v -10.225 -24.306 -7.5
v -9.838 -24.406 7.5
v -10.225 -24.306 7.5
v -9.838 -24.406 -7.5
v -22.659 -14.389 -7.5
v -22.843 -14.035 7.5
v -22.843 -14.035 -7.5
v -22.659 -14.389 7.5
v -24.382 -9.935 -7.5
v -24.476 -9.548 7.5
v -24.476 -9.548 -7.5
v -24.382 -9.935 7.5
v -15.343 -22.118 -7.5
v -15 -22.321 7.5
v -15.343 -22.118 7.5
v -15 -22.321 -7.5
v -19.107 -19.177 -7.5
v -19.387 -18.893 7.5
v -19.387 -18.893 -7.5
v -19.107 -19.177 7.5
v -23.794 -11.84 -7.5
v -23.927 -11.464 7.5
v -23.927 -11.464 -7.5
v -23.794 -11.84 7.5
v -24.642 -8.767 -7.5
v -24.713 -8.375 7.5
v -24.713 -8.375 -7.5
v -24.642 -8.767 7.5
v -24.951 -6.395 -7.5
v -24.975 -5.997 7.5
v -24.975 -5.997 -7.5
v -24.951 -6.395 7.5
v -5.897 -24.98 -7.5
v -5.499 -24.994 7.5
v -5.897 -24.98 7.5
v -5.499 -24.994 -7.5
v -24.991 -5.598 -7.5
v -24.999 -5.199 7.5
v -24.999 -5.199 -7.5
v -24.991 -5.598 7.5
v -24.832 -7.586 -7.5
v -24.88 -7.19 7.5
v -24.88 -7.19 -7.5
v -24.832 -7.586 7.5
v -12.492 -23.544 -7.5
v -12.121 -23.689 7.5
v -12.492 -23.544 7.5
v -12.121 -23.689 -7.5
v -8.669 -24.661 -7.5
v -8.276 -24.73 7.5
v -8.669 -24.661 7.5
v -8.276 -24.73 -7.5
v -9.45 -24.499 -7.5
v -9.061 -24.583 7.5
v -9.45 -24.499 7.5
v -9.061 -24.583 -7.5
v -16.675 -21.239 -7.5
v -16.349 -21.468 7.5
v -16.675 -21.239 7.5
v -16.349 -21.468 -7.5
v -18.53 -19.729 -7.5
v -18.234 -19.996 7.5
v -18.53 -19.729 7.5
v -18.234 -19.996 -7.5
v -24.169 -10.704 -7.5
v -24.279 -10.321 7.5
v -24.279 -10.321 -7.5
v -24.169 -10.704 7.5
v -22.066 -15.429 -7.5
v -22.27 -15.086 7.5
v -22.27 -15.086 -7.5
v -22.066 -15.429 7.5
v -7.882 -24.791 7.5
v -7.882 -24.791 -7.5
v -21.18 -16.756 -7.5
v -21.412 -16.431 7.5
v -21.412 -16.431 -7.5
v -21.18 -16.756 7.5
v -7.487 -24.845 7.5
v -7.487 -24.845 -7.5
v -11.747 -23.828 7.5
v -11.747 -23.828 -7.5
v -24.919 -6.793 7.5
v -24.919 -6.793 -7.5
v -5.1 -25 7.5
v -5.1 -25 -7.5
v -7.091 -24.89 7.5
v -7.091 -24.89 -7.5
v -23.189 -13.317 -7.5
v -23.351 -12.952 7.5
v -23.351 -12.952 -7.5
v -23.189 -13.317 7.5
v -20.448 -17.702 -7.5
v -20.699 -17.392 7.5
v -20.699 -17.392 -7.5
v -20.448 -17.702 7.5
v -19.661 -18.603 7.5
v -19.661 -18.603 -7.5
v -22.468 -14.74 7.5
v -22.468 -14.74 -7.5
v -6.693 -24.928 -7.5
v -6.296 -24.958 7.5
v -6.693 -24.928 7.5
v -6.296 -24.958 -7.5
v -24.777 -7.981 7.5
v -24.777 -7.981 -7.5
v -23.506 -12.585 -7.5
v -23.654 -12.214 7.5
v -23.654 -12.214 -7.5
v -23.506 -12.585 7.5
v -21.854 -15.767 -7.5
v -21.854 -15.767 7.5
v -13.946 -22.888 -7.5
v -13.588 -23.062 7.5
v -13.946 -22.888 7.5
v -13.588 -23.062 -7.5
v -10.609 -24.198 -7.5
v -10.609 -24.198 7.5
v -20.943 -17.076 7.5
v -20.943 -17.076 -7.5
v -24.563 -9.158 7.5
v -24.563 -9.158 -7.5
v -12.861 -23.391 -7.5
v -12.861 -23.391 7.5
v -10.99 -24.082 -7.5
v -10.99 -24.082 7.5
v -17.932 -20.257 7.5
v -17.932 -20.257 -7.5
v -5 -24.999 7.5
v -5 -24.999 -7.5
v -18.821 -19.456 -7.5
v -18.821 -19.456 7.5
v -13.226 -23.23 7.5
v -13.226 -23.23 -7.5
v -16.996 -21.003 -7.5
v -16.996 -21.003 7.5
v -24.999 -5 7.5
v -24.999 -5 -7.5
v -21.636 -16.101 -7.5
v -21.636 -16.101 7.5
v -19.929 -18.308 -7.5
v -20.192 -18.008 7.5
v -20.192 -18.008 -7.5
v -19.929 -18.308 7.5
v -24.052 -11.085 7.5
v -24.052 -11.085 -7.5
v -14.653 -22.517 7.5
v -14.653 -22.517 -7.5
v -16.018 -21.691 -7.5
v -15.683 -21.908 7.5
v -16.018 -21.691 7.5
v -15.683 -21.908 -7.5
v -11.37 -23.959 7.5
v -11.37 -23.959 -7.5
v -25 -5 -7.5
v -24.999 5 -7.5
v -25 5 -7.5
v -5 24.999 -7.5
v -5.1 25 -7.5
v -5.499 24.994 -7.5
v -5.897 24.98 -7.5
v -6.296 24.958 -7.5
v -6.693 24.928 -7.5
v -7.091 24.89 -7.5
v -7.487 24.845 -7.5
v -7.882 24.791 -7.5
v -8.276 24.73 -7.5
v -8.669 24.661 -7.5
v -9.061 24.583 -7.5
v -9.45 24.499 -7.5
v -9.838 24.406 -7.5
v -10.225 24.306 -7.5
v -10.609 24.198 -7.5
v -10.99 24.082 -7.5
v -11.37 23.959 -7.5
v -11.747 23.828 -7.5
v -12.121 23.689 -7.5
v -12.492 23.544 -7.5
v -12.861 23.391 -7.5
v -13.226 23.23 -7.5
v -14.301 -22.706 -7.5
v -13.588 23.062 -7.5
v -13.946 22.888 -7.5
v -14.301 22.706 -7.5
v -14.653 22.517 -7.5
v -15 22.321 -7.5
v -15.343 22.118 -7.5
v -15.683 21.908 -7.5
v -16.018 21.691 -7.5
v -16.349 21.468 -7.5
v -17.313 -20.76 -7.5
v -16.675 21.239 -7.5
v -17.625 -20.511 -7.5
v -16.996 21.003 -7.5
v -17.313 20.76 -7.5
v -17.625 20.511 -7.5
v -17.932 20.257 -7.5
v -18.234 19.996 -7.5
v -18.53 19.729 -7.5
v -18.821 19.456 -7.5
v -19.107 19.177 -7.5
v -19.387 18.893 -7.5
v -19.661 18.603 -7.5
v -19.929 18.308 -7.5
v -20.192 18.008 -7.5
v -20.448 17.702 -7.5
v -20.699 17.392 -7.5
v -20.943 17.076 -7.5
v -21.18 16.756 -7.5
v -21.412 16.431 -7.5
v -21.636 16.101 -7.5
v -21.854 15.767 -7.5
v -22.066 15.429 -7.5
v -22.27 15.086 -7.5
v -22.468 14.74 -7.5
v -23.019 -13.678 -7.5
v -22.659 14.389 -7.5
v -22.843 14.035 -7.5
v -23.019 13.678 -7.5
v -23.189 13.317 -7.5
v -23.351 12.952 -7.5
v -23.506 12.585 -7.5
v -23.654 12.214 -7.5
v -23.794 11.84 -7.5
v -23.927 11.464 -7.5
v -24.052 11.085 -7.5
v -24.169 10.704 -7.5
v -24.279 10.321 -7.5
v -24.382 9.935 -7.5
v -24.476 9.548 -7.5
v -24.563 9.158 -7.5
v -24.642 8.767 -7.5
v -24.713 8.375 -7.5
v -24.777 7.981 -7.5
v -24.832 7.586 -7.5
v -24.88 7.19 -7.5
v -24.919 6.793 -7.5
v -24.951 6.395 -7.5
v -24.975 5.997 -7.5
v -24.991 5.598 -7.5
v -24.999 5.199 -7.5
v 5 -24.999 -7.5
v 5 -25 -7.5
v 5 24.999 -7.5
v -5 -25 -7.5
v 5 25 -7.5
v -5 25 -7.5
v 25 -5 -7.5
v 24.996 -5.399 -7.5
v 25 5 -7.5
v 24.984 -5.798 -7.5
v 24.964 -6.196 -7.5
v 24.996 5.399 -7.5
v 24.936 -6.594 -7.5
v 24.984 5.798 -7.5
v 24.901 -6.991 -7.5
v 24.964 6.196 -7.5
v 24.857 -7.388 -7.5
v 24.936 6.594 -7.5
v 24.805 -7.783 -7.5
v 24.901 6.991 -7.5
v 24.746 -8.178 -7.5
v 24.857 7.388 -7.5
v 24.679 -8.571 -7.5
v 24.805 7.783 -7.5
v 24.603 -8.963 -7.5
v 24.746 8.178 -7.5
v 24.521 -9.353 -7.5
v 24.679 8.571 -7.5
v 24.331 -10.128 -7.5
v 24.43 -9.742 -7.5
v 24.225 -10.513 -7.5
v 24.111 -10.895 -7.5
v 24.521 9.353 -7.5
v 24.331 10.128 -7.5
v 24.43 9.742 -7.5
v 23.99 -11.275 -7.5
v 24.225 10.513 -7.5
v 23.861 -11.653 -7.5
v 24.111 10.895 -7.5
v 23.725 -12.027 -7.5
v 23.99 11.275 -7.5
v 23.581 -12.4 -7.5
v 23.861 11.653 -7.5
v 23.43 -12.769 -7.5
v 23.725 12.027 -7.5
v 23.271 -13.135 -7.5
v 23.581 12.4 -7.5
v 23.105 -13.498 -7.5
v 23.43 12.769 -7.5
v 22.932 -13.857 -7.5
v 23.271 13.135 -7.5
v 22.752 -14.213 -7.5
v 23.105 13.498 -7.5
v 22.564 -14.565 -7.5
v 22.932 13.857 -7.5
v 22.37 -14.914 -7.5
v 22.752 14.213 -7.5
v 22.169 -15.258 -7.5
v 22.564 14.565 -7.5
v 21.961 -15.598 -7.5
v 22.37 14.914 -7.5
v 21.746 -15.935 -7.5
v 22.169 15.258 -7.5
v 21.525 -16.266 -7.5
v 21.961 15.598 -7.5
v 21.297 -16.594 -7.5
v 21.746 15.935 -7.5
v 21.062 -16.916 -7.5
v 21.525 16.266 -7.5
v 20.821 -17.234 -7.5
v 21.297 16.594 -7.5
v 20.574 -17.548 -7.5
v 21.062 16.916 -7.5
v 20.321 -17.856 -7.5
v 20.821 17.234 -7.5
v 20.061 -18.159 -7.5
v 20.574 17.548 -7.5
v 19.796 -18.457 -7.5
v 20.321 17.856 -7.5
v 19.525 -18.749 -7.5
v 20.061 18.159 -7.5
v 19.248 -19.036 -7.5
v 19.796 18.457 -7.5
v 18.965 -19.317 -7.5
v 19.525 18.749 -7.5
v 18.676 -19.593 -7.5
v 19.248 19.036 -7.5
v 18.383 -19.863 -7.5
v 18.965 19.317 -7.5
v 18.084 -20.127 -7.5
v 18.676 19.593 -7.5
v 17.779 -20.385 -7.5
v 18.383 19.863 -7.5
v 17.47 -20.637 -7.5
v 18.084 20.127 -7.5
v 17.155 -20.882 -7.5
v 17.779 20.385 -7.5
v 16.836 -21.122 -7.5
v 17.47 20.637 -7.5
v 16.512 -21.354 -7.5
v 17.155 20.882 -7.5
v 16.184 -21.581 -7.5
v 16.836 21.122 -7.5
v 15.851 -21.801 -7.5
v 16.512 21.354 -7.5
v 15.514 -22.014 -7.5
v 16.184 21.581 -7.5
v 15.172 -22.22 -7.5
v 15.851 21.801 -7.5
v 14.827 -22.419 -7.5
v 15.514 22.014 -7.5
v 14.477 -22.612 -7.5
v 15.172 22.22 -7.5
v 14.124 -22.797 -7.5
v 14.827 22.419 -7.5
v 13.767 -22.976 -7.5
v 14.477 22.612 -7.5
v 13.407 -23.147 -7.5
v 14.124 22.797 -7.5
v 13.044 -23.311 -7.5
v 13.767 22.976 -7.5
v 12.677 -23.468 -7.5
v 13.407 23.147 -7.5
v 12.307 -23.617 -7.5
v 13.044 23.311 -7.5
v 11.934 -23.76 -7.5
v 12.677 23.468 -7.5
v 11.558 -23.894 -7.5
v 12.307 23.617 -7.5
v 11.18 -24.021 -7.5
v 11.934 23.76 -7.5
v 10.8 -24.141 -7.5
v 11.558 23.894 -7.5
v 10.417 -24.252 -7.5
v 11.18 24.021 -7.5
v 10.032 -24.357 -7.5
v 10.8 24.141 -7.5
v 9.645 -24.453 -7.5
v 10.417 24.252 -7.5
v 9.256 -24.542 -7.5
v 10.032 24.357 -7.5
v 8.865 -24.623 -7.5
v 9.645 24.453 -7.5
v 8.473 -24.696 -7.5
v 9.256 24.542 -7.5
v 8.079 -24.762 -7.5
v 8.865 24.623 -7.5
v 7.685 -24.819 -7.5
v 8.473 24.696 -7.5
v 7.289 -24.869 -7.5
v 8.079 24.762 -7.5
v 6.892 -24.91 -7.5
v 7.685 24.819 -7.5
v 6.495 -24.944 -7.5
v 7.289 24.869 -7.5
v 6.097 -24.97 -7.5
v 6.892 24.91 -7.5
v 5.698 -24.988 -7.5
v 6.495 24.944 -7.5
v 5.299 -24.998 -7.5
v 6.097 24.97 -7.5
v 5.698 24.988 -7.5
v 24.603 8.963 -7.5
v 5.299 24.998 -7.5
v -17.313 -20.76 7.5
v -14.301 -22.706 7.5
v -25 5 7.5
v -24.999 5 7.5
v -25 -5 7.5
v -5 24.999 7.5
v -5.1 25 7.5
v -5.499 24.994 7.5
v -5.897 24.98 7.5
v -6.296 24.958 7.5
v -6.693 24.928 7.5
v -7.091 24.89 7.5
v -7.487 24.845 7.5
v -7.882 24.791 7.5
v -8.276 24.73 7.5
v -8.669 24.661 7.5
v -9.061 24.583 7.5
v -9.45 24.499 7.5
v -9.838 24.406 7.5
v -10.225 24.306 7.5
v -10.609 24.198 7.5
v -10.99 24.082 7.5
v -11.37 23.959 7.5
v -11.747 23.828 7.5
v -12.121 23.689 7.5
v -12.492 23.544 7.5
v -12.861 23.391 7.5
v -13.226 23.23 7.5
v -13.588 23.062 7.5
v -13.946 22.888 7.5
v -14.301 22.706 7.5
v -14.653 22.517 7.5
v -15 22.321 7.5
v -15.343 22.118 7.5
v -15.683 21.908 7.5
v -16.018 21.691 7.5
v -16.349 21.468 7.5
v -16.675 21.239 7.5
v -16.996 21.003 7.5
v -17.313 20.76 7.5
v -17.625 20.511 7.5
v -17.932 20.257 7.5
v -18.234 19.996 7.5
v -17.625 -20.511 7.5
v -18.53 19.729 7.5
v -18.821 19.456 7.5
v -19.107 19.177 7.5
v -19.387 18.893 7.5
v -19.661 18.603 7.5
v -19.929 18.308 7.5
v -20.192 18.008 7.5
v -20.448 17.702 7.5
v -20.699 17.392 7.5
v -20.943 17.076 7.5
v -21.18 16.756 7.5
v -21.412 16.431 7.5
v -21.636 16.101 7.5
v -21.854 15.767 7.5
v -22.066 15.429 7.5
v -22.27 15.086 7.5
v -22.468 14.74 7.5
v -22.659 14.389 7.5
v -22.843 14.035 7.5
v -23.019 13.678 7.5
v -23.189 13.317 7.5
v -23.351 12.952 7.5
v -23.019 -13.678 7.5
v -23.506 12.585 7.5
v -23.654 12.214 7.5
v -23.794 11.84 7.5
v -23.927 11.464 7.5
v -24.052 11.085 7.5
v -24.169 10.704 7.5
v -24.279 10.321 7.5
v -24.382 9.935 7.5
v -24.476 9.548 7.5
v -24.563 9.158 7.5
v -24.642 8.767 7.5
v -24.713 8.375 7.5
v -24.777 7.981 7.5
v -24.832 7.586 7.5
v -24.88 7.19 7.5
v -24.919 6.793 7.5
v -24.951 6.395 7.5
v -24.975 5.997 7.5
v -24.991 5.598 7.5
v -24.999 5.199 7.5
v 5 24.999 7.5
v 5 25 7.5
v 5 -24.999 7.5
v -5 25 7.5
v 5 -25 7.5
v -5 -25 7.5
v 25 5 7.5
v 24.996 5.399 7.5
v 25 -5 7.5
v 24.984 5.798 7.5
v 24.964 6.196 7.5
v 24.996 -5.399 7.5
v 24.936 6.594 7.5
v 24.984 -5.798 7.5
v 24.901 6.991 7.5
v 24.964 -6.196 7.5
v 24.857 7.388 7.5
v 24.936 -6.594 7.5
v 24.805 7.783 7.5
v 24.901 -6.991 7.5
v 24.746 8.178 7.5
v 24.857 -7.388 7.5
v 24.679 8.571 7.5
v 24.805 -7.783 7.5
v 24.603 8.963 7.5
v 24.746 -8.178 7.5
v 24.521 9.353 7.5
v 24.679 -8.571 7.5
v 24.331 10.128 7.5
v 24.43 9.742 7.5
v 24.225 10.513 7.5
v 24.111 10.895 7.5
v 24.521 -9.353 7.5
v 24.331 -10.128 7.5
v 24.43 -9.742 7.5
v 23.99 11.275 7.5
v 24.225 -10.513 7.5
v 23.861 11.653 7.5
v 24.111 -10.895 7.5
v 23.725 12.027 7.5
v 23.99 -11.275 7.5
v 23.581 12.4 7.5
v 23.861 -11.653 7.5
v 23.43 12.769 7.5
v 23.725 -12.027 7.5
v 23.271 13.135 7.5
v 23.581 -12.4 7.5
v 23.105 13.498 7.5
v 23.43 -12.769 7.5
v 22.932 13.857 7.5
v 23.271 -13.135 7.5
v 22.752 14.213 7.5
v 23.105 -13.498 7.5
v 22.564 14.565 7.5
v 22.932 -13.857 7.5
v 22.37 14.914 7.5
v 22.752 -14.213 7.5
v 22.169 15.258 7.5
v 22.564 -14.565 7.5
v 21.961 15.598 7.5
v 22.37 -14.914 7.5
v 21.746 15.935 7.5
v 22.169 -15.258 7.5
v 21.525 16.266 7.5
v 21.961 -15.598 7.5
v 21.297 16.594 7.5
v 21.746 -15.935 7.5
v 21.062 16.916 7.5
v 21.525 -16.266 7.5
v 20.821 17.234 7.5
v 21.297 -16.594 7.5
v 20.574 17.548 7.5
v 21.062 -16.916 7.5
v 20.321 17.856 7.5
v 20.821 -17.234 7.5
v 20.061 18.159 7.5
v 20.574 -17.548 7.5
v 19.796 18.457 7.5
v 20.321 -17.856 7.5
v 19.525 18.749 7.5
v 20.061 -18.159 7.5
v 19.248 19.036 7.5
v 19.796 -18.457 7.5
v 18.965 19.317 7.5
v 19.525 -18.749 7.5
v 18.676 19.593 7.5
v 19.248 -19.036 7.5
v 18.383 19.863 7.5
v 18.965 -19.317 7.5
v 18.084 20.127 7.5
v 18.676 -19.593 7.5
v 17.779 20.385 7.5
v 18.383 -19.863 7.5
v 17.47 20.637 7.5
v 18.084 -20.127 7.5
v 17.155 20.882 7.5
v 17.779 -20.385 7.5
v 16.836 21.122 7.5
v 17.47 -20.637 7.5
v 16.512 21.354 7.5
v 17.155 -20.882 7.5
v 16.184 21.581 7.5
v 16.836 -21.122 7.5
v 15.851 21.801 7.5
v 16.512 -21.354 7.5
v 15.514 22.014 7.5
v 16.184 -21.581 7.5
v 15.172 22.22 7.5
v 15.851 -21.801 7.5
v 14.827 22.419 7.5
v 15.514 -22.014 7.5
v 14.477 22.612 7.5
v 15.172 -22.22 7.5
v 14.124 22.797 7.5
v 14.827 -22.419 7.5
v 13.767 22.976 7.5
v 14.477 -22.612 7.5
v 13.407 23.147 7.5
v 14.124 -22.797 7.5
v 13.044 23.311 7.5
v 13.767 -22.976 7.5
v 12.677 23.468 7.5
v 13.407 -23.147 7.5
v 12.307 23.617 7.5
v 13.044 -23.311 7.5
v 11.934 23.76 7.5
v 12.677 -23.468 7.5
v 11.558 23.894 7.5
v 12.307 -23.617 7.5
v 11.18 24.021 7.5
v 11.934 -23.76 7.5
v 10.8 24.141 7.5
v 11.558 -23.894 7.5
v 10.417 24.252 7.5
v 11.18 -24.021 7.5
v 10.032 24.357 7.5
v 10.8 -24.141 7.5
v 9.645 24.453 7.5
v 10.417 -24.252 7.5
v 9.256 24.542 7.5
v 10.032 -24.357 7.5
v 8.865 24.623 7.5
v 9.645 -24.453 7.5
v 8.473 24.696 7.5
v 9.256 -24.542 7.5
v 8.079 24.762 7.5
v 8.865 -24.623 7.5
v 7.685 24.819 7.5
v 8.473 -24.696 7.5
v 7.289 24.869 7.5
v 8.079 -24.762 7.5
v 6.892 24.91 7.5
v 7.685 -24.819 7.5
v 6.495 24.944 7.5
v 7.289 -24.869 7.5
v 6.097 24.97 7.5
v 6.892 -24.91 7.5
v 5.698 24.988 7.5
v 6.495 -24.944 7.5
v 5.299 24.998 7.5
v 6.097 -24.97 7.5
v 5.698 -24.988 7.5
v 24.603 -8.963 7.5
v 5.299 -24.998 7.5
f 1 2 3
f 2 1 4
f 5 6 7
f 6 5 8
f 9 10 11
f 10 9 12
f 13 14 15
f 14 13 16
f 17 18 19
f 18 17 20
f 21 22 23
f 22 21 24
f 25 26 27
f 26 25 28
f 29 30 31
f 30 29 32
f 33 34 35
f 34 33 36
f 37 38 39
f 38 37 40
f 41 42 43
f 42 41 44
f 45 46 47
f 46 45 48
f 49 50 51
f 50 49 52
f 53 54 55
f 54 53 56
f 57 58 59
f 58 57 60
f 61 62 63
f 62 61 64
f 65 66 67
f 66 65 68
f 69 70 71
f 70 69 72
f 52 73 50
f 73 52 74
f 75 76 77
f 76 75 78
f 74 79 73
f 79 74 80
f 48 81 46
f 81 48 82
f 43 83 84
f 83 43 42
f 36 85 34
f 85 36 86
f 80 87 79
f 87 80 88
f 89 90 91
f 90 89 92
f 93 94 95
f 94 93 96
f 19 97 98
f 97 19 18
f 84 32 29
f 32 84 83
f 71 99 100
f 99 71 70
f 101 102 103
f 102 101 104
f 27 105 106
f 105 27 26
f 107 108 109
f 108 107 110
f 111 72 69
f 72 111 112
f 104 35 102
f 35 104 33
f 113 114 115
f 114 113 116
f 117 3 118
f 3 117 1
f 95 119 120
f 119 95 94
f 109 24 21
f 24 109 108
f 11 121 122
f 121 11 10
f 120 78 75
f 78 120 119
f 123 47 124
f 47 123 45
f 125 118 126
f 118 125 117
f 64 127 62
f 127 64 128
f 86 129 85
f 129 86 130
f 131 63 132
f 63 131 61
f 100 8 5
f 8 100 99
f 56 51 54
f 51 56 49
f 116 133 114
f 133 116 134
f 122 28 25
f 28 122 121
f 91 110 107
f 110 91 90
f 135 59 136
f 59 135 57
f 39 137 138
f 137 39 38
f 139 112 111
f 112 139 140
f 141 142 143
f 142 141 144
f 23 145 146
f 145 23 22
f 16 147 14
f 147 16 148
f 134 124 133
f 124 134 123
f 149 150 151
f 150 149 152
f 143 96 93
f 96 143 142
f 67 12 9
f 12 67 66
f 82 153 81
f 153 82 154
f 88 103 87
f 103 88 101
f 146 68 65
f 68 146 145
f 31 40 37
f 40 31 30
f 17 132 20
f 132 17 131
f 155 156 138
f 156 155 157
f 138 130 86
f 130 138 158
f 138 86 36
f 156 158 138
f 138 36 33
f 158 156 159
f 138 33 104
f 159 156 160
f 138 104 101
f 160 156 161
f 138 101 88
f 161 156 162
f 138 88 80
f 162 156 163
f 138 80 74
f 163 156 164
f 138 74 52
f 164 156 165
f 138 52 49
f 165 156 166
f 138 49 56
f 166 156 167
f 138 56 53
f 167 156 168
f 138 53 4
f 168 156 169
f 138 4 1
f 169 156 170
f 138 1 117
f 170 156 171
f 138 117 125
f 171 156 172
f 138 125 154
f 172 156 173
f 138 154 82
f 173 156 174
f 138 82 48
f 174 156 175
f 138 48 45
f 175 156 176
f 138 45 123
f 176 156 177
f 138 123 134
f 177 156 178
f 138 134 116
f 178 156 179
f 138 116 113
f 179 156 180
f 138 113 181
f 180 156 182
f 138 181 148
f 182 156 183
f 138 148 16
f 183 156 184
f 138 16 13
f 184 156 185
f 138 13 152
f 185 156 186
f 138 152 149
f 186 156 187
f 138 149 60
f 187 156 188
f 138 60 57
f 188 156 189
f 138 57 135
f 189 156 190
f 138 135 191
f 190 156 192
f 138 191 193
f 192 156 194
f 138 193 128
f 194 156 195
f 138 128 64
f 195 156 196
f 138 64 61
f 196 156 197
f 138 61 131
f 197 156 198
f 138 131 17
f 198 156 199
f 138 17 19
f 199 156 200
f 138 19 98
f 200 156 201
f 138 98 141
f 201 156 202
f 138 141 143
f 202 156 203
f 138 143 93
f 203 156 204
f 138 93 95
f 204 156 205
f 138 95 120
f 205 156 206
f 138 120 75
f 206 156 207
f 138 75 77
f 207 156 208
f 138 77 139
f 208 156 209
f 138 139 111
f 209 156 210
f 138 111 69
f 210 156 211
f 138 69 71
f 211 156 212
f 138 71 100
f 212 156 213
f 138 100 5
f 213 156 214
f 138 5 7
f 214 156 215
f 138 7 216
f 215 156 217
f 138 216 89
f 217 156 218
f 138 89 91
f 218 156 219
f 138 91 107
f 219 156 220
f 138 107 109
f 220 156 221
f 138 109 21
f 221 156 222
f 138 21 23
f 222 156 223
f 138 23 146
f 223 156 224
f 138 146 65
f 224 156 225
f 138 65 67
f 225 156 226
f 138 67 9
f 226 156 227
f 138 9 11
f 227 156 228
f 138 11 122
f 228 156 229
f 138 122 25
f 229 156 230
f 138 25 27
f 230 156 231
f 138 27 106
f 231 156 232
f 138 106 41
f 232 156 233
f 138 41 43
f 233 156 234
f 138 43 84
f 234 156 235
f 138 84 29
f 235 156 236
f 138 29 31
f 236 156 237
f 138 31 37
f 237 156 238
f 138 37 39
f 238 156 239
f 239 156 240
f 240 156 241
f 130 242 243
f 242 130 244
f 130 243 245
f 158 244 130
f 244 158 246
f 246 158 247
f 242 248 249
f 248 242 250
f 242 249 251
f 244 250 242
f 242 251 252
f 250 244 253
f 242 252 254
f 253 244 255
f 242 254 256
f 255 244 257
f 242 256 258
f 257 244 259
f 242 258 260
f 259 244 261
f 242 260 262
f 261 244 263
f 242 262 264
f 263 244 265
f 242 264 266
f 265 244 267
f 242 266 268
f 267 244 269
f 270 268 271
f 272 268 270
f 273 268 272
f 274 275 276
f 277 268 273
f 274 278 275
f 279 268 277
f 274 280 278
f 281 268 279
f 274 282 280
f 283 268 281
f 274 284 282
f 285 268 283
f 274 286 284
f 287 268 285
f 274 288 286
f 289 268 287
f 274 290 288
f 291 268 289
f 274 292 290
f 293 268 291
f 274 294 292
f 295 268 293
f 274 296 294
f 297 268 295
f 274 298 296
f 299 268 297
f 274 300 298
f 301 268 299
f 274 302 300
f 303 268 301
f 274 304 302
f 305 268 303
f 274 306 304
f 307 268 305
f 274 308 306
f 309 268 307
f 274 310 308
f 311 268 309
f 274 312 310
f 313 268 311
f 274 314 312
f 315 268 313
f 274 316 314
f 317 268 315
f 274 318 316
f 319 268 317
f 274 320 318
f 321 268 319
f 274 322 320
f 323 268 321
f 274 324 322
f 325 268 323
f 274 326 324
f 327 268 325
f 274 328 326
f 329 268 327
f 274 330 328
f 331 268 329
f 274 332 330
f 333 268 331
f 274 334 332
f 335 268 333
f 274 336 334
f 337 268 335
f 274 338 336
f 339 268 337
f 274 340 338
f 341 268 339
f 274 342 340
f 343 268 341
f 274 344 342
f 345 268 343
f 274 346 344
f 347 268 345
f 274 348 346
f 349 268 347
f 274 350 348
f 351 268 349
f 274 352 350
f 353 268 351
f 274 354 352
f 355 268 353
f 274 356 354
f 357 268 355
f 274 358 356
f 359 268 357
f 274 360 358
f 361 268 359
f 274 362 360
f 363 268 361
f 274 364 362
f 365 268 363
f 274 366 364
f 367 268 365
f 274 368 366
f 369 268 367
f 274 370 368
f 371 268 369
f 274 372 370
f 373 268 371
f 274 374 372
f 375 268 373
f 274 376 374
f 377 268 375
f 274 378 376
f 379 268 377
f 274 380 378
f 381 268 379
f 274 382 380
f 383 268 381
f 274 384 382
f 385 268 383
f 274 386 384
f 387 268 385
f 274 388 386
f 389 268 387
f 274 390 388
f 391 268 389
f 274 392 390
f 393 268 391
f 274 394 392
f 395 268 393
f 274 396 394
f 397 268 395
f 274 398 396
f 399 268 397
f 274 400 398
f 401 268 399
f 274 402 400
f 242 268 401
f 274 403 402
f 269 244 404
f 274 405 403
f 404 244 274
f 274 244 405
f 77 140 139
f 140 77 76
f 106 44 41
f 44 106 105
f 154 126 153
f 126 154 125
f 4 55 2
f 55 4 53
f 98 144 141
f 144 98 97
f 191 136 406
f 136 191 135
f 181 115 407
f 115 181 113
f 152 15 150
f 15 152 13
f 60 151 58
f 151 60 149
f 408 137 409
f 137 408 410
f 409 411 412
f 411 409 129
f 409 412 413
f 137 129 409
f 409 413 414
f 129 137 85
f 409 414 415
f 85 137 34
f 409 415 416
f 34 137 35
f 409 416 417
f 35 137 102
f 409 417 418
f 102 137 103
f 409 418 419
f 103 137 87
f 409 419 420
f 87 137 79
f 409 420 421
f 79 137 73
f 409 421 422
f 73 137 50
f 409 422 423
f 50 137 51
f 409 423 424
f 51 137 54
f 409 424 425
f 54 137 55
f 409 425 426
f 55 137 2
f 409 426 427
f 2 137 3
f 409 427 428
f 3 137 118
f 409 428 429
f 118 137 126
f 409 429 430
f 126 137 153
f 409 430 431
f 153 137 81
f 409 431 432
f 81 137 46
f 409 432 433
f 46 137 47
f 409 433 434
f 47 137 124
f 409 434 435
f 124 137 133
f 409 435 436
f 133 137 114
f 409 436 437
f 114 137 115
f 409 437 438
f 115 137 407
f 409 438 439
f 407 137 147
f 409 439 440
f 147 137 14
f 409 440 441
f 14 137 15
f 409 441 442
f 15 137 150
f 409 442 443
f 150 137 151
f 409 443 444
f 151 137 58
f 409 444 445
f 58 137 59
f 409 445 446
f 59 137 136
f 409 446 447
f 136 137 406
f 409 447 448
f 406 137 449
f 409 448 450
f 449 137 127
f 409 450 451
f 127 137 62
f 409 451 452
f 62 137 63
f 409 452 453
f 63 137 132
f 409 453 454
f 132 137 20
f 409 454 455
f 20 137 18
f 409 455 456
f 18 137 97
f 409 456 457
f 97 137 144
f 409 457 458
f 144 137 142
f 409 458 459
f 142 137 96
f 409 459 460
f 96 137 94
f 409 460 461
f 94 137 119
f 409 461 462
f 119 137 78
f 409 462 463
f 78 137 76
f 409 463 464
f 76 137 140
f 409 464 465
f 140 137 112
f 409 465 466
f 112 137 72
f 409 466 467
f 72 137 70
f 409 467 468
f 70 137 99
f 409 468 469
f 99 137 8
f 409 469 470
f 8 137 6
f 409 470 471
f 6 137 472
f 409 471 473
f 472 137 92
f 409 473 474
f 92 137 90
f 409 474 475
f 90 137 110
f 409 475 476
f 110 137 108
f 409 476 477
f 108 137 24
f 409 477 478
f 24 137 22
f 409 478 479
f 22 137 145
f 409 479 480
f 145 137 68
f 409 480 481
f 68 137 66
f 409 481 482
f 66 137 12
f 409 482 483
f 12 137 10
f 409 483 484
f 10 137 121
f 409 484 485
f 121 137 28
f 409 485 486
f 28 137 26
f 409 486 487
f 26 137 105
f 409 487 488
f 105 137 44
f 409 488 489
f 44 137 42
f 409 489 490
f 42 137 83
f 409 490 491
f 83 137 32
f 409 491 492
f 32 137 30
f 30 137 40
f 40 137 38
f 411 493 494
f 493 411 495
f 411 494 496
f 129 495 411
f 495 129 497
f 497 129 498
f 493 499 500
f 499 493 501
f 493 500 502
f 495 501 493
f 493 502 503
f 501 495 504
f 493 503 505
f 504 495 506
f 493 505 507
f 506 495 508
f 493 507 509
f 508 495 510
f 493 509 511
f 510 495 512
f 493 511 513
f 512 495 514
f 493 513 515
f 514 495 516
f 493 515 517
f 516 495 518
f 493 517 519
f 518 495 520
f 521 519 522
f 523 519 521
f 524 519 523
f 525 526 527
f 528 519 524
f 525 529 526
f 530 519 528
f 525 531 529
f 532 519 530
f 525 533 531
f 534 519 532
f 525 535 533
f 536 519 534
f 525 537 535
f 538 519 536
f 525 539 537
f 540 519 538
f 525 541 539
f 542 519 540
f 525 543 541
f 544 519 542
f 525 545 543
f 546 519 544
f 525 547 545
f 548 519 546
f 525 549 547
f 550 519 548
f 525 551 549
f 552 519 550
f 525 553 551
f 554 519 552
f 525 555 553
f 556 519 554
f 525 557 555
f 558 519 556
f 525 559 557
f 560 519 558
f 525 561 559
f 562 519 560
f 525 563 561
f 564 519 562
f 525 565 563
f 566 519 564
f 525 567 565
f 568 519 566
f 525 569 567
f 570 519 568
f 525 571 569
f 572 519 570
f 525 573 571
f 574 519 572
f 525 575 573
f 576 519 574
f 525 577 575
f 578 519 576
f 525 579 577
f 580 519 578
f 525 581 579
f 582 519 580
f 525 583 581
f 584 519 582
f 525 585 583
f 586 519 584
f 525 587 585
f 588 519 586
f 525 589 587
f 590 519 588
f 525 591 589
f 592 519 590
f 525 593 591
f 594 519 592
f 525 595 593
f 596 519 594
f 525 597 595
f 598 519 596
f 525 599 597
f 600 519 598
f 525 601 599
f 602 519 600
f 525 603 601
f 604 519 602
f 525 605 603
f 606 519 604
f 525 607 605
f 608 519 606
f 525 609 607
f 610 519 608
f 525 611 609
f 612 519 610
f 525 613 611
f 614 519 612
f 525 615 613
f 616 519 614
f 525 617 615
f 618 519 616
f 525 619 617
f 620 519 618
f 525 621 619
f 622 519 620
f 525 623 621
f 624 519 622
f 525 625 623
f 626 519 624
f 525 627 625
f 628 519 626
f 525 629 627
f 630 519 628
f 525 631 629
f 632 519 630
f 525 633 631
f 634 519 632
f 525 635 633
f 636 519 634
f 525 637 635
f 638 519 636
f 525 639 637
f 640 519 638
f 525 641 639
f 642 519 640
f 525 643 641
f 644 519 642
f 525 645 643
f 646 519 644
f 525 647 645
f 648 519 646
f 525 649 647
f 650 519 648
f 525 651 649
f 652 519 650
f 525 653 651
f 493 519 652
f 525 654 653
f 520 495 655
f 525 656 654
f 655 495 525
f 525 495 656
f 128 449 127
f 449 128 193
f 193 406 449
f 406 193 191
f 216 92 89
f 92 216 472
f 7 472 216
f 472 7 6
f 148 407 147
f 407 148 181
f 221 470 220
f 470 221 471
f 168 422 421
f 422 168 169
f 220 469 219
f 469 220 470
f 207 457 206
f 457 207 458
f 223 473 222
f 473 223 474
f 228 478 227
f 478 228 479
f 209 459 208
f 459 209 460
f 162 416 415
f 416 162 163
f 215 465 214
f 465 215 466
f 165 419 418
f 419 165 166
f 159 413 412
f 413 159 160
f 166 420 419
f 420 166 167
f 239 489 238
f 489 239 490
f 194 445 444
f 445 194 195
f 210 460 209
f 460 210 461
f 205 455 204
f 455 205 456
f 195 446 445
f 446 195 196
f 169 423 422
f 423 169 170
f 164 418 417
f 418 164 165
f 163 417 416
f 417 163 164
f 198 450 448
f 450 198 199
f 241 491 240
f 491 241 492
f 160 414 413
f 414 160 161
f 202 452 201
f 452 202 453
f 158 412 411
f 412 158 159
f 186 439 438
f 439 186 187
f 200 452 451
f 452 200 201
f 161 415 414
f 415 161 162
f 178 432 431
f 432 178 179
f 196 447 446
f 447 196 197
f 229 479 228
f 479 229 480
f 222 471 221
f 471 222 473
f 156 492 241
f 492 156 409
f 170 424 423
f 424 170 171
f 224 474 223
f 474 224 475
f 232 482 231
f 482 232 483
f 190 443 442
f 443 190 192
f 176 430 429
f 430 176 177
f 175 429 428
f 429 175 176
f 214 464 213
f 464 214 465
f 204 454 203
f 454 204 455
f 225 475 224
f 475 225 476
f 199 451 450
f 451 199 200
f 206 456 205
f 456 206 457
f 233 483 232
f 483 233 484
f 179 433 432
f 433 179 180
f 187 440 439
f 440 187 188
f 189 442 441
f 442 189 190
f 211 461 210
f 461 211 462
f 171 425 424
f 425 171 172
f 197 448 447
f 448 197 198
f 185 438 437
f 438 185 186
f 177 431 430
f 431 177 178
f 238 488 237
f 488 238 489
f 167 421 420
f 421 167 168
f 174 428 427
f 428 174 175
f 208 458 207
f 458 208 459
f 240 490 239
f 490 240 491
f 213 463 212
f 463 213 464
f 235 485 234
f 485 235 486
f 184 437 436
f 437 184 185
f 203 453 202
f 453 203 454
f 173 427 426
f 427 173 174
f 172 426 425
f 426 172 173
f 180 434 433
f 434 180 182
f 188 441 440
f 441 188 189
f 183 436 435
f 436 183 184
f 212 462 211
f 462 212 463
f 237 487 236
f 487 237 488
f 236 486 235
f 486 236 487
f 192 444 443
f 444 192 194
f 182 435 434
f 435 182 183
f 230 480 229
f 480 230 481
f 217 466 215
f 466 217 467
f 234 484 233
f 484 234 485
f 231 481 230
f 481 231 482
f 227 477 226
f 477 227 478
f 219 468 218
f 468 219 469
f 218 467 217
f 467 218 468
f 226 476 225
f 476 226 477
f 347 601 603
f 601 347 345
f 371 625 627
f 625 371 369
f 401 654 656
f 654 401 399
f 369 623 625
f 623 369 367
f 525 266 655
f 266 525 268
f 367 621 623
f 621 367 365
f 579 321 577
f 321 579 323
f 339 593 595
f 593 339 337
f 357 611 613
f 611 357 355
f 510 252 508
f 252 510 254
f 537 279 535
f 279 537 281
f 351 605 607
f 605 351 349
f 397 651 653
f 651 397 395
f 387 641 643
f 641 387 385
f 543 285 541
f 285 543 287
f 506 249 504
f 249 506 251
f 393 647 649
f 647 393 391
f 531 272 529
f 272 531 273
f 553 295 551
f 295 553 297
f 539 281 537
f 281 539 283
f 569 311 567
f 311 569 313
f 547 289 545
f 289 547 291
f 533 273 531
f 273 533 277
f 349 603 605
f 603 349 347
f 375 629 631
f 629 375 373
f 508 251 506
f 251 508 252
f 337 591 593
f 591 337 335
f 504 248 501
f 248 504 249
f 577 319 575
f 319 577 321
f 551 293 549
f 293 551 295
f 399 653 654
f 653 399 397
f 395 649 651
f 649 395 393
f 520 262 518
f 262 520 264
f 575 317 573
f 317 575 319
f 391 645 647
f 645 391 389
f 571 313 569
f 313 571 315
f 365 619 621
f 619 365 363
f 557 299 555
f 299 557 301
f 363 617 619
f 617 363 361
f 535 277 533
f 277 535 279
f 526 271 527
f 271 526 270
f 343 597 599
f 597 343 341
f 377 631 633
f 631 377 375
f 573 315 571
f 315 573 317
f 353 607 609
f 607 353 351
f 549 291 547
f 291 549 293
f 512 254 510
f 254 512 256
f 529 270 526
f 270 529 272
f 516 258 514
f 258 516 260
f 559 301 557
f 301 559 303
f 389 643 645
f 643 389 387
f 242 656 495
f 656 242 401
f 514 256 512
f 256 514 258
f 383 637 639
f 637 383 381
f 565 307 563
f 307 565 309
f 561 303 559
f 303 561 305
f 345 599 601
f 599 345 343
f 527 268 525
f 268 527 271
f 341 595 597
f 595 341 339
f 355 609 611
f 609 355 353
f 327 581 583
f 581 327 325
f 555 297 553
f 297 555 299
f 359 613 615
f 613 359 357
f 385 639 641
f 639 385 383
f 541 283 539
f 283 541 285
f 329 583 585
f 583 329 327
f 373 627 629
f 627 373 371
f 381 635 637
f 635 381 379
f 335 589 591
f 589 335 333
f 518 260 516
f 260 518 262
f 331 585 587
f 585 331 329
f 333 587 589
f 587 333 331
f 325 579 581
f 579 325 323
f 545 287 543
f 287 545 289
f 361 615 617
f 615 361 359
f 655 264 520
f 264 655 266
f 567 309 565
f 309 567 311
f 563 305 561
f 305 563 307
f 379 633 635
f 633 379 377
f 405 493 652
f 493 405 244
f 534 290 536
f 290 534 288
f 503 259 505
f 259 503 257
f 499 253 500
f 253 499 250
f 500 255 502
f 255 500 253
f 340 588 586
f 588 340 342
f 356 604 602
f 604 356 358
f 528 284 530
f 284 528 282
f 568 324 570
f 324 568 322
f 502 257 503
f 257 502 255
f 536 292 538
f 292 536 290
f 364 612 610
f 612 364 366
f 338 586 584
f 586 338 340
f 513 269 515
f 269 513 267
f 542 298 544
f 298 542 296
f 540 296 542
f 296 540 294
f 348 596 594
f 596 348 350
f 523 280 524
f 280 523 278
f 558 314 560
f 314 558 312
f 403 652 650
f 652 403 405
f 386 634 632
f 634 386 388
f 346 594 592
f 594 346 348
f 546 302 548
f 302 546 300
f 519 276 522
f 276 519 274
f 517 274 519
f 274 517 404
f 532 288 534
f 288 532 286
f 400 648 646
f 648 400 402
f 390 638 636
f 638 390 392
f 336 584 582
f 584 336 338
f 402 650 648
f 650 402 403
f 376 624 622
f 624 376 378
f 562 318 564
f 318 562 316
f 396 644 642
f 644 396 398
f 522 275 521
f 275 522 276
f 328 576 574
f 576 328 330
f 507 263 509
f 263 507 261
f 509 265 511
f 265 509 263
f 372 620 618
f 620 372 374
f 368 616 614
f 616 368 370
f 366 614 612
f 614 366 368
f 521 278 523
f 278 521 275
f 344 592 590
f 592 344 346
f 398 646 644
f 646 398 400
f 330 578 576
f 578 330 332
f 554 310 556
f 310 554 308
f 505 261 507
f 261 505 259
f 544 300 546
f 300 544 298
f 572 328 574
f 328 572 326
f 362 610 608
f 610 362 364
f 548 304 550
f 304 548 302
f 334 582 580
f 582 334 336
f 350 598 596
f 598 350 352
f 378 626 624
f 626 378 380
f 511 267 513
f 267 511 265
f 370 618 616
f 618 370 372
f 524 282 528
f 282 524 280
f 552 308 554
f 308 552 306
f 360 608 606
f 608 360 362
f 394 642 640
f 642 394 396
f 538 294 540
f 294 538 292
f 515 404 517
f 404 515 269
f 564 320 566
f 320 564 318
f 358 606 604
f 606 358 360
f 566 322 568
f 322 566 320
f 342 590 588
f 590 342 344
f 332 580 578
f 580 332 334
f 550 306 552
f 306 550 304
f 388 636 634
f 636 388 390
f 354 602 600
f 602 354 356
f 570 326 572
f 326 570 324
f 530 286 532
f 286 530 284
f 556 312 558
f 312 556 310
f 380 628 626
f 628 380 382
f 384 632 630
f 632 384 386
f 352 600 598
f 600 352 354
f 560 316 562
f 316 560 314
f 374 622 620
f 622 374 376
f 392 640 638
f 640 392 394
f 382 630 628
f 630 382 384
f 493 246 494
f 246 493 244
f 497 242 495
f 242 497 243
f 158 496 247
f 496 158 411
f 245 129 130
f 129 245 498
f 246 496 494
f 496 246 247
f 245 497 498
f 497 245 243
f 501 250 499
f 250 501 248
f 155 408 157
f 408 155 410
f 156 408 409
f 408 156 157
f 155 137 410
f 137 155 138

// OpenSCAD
use <MCAD/boxes.scad>
$fa=1;
$fs=0.4;
roundedBox(size=[50,50,15],radius=20,sidesonly=true);
